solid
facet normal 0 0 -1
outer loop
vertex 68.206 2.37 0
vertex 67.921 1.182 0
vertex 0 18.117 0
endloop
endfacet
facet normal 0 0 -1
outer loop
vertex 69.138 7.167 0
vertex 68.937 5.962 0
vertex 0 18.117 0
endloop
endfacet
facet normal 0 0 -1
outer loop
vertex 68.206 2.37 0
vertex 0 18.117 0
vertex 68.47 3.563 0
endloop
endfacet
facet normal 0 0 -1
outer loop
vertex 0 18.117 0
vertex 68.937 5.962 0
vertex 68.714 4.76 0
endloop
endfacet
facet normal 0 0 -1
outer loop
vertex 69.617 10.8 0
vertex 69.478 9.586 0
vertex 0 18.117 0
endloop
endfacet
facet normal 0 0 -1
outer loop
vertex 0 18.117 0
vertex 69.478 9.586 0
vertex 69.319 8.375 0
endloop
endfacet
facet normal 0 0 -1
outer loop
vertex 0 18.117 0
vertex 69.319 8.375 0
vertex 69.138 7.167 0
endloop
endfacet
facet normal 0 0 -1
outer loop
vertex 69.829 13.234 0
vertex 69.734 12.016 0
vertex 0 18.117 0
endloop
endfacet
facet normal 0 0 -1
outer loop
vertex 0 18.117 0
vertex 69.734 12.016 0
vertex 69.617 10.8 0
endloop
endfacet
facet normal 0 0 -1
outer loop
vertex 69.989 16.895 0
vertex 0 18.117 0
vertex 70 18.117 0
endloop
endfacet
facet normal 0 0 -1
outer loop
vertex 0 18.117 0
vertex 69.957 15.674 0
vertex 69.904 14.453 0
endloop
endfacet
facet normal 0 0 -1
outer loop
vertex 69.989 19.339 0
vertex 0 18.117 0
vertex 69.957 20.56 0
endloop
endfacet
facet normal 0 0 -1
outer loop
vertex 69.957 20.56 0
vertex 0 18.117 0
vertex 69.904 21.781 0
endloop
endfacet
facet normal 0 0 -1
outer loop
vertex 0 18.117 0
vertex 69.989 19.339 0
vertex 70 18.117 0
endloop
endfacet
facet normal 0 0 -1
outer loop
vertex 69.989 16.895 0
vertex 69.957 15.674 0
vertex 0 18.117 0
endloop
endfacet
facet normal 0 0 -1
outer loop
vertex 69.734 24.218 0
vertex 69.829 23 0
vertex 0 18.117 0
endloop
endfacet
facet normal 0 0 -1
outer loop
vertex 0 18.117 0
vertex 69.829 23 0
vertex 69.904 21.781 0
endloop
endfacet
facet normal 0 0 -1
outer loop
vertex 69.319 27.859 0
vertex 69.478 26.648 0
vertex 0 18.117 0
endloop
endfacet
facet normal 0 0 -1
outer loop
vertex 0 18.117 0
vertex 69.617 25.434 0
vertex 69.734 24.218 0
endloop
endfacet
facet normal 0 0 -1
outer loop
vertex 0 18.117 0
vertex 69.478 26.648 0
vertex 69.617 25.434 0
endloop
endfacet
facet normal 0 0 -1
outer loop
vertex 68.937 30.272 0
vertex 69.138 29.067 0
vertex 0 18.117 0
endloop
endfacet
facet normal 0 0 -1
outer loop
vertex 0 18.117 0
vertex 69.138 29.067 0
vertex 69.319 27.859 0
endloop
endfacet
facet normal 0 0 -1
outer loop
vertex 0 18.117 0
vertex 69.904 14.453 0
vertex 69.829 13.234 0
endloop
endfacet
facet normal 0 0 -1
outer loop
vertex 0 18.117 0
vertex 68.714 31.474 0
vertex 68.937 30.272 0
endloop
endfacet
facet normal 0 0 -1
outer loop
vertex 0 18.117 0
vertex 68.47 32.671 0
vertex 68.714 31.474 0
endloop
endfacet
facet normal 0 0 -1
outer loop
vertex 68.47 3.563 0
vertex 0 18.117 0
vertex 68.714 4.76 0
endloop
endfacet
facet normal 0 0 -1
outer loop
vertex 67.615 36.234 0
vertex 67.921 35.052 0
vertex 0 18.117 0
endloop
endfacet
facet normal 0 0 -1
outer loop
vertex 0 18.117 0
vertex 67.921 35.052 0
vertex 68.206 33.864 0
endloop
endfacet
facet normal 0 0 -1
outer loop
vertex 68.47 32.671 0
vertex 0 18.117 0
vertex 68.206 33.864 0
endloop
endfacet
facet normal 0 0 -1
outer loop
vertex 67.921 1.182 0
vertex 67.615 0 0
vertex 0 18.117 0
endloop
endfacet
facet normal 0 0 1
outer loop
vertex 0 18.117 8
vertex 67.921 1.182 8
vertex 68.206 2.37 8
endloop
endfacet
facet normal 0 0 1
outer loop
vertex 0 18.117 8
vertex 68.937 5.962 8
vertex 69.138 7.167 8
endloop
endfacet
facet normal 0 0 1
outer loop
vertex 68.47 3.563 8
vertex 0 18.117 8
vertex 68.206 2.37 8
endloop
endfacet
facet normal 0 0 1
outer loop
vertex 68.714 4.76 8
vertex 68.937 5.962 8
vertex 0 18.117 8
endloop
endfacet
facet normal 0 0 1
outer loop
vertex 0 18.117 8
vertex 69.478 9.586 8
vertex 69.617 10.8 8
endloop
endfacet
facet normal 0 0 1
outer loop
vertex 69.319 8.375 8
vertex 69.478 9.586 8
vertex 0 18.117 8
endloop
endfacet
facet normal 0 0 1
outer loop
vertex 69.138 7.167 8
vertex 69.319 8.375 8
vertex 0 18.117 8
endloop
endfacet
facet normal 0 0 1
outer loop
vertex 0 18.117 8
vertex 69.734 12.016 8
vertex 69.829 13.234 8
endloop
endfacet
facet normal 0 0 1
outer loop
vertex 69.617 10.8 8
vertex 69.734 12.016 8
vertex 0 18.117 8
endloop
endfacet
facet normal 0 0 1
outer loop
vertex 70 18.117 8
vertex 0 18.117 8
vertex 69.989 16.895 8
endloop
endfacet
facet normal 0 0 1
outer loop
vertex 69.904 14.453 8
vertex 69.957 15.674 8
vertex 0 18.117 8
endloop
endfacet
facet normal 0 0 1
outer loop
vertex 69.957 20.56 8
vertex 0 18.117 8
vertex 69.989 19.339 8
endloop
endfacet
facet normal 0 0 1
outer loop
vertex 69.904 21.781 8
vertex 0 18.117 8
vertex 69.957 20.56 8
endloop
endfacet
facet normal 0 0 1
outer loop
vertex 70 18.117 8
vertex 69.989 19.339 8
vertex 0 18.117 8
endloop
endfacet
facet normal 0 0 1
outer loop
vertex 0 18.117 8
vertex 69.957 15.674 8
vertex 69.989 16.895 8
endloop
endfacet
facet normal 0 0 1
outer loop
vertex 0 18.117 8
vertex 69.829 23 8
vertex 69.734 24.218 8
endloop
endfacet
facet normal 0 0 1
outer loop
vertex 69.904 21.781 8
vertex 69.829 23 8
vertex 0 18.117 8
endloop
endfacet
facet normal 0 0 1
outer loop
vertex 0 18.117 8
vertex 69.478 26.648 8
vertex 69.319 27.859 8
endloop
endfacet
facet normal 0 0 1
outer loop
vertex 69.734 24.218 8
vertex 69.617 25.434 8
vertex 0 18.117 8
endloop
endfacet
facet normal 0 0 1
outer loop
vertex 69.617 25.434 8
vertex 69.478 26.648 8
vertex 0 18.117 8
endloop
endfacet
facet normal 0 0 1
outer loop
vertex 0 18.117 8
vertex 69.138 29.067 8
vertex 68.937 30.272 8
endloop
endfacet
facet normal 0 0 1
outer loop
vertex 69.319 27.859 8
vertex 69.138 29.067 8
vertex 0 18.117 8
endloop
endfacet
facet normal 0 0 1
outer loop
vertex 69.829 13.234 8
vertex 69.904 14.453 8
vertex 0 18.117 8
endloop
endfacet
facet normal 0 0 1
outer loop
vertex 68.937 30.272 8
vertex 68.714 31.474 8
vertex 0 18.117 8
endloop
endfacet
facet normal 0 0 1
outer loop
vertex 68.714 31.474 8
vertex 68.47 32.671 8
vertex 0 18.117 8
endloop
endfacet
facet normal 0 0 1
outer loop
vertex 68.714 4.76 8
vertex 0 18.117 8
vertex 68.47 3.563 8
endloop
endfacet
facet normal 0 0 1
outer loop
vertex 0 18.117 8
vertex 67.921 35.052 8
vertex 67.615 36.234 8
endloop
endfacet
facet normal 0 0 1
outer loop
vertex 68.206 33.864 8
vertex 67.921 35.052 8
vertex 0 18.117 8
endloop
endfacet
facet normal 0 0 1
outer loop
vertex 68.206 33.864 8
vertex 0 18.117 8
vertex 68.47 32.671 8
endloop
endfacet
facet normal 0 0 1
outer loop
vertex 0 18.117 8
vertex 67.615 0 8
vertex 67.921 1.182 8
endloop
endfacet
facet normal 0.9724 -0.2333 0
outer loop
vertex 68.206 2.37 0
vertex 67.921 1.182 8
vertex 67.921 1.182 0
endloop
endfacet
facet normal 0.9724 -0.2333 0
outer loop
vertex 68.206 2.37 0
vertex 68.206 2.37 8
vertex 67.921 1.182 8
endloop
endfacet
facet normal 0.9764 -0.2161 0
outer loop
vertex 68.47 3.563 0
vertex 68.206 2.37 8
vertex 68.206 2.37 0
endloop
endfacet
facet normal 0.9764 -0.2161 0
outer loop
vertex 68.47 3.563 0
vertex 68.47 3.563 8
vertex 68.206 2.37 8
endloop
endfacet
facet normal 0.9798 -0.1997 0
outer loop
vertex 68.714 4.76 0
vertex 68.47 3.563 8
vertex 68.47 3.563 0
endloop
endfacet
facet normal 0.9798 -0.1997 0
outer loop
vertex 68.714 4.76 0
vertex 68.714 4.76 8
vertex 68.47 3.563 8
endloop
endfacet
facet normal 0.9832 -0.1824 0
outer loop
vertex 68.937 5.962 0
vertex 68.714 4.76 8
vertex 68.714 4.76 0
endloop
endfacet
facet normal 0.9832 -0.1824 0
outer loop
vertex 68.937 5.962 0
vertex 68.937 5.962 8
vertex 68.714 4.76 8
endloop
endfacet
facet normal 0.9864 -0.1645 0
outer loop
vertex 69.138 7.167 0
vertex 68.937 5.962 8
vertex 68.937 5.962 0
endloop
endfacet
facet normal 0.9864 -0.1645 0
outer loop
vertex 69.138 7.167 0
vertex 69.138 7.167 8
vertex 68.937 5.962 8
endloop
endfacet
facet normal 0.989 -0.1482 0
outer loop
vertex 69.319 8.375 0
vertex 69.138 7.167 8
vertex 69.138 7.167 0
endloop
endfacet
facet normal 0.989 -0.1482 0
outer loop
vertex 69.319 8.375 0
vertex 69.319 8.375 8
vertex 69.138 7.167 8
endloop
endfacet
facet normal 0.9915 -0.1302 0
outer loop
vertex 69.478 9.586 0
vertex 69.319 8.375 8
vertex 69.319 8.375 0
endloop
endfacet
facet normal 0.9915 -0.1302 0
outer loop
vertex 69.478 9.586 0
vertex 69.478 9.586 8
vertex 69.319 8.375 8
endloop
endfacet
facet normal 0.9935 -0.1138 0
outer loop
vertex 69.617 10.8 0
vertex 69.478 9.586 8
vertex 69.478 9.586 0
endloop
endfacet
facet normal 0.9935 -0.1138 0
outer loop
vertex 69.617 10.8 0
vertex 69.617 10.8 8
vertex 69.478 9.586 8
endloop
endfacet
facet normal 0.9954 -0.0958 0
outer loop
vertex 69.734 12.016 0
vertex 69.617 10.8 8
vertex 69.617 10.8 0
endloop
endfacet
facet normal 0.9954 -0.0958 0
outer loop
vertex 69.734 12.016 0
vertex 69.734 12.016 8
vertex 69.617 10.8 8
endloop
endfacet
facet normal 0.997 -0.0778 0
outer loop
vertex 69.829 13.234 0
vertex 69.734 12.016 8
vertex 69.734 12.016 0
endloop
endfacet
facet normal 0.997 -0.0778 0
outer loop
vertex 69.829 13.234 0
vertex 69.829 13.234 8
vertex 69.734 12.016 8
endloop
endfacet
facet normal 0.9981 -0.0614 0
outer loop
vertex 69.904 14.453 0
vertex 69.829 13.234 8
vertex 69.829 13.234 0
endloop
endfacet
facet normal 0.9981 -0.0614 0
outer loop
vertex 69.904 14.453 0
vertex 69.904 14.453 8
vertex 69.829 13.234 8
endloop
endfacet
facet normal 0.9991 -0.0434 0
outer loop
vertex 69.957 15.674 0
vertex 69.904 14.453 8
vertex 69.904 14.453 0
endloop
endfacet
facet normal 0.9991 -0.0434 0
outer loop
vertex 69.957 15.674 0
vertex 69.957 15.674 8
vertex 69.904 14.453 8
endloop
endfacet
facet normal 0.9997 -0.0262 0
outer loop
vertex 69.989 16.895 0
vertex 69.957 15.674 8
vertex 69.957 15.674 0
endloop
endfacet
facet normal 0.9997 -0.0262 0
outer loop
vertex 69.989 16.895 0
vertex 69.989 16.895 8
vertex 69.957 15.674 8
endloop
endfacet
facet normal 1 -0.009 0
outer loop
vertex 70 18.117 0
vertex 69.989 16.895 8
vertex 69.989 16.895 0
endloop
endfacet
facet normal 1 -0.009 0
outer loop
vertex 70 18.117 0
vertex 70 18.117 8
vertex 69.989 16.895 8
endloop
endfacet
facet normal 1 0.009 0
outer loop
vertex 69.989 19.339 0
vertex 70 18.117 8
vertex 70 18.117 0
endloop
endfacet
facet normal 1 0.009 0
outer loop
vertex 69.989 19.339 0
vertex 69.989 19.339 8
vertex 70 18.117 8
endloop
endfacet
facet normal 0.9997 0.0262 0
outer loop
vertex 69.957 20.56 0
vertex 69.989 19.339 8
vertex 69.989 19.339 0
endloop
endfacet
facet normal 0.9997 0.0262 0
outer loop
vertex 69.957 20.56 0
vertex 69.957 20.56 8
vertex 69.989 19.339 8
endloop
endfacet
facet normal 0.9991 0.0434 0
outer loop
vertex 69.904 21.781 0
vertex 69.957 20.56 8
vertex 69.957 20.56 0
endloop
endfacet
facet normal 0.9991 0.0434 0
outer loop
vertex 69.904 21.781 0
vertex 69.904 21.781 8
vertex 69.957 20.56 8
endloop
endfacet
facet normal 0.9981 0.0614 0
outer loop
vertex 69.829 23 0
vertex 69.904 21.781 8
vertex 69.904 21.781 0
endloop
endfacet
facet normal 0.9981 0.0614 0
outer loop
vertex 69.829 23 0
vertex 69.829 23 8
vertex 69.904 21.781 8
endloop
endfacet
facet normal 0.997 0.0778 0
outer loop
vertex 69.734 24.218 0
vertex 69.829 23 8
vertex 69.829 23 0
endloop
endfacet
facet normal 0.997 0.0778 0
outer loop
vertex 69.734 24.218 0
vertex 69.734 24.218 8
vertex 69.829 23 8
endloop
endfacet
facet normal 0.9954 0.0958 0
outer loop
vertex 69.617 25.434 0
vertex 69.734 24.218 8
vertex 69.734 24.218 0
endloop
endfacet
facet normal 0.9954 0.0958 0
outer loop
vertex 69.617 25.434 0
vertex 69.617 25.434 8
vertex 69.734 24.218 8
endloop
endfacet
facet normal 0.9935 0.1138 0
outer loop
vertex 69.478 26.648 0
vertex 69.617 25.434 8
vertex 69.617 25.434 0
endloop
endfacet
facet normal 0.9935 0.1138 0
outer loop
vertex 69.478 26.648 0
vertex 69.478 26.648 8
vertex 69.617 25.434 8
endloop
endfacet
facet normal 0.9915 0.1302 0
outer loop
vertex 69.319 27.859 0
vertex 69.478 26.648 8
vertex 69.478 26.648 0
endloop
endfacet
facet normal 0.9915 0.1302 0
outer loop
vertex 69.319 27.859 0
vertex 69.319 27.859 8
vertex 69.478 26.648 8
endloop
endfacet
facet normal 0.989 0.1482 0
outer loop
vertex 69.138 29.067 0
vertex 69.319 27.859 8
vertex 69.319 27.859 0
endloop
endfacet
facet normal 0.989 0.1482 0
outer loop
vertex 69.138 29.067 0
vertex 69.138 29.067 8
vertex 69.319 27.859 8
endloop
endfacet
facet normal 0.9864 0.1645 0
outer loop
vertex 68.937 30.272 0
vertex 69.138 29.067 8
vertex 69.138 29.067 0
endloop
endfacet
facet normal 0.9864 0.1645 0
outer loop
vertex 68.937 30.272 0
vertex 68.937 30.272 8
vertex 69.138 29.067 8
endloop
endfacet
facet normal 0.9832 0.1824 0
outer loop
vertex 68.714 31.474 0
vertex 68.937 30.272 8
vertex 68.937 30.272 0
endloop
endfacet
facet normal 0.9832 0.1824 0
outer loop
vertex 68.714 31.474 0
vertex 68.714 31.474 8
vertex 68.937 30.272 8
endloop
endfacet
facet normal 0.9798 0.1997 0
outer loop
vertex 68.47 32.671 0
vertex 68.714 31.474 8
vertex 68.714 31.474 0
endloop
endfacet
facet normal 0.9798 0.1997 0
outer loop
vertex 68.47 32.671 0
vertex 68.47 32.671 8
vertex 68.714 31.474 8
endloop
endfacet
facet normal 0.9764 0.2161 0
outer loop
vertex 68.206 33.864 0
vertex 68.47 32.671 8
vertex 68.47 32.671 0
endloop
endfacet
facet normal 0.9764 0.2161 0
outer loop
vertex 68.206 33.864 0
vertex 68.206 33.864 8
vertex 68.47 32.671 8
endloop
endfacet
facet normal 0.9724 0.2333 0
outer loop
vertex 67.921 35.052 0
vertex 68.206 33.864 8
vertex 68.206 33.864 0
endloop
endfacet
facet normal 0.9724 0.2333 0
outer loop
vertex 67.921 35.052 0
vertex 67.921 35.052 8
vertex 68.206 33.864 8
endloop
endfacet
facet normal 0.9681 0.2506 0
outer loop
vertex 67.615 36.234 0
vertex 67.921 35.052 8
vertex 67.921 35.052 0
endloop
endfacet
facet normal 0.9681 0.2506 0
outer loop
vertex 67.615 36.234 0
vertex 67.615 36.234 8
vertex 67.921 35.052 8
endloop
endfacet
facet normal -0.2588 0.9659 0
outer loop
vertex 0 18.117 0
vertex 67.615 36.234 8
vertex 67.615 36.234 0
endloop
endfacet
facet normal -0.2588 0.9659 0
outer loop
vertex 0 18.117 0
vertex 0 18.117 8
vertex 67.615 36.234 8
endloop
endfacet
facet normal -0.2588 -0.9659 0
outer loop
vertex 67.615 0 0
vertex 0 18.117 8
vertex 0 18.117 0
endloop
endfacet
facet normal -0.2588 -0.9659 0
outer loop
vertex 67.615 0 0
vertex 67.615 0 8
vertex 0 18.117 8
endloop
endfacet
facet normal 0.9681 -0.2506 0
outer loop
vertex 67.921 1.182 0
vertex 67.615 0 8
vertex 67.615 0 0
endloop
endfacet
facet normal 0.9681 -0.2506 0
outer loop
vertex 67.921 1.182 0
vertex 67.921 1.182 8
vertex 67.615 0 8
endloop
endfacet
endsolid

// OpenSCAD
$fn = 32;

// ----------------------------------------------------------------------
// Arc profile plate: sector, 32 points
// ----------------------------------------------------------------------

// --- parameters (mm) ---
sector_angle = 30;        // sector angle, degrees
sector_r = 70;            // outer radius
arc_step = 1;             // sampling step of the arc, degrees
plate_t = 8;              // plate thickness, Z

bbox_x = 2 * sector_r * sin(sector_angle / 2);  // chord of the sector
bbox_y = sector_r;  // depth of the sector (apex to arc)

profile = [[67.615, 0], [67.921, 1.182], [68.206, 2.37], [68.47, 3.563], [68.714, 4.76], [68.937, 5.962], [69.138, 7.167], [69.319, 8.375], [69.478, 9.586], [69.617, 10.8], [69.734, 12.016], [69.829, 13.234], [69.904, 14.453], [69.957, 15.674], [69.989, 16.895], [70, 18.117], [69.989, 19.339], [69.957, 20.56], [69.904, 21.781], [69.829, 23], [69.734, 24.218], [69.617, 25.434], [69.478, 26.648], [69.319, 27.859], [69.138, 29.067], [68.937, 30.272], [68.714, 31.474], [68.47, 32.671], [68.206, 33.864], [67.921, 35.052], [67.615, 36.234], [0, 18.117]];  // primary outline, 32 points, counter clockwise

// --- the one profile operation ---
linear_extrude(height = plate_t) polygon(points = profile);
